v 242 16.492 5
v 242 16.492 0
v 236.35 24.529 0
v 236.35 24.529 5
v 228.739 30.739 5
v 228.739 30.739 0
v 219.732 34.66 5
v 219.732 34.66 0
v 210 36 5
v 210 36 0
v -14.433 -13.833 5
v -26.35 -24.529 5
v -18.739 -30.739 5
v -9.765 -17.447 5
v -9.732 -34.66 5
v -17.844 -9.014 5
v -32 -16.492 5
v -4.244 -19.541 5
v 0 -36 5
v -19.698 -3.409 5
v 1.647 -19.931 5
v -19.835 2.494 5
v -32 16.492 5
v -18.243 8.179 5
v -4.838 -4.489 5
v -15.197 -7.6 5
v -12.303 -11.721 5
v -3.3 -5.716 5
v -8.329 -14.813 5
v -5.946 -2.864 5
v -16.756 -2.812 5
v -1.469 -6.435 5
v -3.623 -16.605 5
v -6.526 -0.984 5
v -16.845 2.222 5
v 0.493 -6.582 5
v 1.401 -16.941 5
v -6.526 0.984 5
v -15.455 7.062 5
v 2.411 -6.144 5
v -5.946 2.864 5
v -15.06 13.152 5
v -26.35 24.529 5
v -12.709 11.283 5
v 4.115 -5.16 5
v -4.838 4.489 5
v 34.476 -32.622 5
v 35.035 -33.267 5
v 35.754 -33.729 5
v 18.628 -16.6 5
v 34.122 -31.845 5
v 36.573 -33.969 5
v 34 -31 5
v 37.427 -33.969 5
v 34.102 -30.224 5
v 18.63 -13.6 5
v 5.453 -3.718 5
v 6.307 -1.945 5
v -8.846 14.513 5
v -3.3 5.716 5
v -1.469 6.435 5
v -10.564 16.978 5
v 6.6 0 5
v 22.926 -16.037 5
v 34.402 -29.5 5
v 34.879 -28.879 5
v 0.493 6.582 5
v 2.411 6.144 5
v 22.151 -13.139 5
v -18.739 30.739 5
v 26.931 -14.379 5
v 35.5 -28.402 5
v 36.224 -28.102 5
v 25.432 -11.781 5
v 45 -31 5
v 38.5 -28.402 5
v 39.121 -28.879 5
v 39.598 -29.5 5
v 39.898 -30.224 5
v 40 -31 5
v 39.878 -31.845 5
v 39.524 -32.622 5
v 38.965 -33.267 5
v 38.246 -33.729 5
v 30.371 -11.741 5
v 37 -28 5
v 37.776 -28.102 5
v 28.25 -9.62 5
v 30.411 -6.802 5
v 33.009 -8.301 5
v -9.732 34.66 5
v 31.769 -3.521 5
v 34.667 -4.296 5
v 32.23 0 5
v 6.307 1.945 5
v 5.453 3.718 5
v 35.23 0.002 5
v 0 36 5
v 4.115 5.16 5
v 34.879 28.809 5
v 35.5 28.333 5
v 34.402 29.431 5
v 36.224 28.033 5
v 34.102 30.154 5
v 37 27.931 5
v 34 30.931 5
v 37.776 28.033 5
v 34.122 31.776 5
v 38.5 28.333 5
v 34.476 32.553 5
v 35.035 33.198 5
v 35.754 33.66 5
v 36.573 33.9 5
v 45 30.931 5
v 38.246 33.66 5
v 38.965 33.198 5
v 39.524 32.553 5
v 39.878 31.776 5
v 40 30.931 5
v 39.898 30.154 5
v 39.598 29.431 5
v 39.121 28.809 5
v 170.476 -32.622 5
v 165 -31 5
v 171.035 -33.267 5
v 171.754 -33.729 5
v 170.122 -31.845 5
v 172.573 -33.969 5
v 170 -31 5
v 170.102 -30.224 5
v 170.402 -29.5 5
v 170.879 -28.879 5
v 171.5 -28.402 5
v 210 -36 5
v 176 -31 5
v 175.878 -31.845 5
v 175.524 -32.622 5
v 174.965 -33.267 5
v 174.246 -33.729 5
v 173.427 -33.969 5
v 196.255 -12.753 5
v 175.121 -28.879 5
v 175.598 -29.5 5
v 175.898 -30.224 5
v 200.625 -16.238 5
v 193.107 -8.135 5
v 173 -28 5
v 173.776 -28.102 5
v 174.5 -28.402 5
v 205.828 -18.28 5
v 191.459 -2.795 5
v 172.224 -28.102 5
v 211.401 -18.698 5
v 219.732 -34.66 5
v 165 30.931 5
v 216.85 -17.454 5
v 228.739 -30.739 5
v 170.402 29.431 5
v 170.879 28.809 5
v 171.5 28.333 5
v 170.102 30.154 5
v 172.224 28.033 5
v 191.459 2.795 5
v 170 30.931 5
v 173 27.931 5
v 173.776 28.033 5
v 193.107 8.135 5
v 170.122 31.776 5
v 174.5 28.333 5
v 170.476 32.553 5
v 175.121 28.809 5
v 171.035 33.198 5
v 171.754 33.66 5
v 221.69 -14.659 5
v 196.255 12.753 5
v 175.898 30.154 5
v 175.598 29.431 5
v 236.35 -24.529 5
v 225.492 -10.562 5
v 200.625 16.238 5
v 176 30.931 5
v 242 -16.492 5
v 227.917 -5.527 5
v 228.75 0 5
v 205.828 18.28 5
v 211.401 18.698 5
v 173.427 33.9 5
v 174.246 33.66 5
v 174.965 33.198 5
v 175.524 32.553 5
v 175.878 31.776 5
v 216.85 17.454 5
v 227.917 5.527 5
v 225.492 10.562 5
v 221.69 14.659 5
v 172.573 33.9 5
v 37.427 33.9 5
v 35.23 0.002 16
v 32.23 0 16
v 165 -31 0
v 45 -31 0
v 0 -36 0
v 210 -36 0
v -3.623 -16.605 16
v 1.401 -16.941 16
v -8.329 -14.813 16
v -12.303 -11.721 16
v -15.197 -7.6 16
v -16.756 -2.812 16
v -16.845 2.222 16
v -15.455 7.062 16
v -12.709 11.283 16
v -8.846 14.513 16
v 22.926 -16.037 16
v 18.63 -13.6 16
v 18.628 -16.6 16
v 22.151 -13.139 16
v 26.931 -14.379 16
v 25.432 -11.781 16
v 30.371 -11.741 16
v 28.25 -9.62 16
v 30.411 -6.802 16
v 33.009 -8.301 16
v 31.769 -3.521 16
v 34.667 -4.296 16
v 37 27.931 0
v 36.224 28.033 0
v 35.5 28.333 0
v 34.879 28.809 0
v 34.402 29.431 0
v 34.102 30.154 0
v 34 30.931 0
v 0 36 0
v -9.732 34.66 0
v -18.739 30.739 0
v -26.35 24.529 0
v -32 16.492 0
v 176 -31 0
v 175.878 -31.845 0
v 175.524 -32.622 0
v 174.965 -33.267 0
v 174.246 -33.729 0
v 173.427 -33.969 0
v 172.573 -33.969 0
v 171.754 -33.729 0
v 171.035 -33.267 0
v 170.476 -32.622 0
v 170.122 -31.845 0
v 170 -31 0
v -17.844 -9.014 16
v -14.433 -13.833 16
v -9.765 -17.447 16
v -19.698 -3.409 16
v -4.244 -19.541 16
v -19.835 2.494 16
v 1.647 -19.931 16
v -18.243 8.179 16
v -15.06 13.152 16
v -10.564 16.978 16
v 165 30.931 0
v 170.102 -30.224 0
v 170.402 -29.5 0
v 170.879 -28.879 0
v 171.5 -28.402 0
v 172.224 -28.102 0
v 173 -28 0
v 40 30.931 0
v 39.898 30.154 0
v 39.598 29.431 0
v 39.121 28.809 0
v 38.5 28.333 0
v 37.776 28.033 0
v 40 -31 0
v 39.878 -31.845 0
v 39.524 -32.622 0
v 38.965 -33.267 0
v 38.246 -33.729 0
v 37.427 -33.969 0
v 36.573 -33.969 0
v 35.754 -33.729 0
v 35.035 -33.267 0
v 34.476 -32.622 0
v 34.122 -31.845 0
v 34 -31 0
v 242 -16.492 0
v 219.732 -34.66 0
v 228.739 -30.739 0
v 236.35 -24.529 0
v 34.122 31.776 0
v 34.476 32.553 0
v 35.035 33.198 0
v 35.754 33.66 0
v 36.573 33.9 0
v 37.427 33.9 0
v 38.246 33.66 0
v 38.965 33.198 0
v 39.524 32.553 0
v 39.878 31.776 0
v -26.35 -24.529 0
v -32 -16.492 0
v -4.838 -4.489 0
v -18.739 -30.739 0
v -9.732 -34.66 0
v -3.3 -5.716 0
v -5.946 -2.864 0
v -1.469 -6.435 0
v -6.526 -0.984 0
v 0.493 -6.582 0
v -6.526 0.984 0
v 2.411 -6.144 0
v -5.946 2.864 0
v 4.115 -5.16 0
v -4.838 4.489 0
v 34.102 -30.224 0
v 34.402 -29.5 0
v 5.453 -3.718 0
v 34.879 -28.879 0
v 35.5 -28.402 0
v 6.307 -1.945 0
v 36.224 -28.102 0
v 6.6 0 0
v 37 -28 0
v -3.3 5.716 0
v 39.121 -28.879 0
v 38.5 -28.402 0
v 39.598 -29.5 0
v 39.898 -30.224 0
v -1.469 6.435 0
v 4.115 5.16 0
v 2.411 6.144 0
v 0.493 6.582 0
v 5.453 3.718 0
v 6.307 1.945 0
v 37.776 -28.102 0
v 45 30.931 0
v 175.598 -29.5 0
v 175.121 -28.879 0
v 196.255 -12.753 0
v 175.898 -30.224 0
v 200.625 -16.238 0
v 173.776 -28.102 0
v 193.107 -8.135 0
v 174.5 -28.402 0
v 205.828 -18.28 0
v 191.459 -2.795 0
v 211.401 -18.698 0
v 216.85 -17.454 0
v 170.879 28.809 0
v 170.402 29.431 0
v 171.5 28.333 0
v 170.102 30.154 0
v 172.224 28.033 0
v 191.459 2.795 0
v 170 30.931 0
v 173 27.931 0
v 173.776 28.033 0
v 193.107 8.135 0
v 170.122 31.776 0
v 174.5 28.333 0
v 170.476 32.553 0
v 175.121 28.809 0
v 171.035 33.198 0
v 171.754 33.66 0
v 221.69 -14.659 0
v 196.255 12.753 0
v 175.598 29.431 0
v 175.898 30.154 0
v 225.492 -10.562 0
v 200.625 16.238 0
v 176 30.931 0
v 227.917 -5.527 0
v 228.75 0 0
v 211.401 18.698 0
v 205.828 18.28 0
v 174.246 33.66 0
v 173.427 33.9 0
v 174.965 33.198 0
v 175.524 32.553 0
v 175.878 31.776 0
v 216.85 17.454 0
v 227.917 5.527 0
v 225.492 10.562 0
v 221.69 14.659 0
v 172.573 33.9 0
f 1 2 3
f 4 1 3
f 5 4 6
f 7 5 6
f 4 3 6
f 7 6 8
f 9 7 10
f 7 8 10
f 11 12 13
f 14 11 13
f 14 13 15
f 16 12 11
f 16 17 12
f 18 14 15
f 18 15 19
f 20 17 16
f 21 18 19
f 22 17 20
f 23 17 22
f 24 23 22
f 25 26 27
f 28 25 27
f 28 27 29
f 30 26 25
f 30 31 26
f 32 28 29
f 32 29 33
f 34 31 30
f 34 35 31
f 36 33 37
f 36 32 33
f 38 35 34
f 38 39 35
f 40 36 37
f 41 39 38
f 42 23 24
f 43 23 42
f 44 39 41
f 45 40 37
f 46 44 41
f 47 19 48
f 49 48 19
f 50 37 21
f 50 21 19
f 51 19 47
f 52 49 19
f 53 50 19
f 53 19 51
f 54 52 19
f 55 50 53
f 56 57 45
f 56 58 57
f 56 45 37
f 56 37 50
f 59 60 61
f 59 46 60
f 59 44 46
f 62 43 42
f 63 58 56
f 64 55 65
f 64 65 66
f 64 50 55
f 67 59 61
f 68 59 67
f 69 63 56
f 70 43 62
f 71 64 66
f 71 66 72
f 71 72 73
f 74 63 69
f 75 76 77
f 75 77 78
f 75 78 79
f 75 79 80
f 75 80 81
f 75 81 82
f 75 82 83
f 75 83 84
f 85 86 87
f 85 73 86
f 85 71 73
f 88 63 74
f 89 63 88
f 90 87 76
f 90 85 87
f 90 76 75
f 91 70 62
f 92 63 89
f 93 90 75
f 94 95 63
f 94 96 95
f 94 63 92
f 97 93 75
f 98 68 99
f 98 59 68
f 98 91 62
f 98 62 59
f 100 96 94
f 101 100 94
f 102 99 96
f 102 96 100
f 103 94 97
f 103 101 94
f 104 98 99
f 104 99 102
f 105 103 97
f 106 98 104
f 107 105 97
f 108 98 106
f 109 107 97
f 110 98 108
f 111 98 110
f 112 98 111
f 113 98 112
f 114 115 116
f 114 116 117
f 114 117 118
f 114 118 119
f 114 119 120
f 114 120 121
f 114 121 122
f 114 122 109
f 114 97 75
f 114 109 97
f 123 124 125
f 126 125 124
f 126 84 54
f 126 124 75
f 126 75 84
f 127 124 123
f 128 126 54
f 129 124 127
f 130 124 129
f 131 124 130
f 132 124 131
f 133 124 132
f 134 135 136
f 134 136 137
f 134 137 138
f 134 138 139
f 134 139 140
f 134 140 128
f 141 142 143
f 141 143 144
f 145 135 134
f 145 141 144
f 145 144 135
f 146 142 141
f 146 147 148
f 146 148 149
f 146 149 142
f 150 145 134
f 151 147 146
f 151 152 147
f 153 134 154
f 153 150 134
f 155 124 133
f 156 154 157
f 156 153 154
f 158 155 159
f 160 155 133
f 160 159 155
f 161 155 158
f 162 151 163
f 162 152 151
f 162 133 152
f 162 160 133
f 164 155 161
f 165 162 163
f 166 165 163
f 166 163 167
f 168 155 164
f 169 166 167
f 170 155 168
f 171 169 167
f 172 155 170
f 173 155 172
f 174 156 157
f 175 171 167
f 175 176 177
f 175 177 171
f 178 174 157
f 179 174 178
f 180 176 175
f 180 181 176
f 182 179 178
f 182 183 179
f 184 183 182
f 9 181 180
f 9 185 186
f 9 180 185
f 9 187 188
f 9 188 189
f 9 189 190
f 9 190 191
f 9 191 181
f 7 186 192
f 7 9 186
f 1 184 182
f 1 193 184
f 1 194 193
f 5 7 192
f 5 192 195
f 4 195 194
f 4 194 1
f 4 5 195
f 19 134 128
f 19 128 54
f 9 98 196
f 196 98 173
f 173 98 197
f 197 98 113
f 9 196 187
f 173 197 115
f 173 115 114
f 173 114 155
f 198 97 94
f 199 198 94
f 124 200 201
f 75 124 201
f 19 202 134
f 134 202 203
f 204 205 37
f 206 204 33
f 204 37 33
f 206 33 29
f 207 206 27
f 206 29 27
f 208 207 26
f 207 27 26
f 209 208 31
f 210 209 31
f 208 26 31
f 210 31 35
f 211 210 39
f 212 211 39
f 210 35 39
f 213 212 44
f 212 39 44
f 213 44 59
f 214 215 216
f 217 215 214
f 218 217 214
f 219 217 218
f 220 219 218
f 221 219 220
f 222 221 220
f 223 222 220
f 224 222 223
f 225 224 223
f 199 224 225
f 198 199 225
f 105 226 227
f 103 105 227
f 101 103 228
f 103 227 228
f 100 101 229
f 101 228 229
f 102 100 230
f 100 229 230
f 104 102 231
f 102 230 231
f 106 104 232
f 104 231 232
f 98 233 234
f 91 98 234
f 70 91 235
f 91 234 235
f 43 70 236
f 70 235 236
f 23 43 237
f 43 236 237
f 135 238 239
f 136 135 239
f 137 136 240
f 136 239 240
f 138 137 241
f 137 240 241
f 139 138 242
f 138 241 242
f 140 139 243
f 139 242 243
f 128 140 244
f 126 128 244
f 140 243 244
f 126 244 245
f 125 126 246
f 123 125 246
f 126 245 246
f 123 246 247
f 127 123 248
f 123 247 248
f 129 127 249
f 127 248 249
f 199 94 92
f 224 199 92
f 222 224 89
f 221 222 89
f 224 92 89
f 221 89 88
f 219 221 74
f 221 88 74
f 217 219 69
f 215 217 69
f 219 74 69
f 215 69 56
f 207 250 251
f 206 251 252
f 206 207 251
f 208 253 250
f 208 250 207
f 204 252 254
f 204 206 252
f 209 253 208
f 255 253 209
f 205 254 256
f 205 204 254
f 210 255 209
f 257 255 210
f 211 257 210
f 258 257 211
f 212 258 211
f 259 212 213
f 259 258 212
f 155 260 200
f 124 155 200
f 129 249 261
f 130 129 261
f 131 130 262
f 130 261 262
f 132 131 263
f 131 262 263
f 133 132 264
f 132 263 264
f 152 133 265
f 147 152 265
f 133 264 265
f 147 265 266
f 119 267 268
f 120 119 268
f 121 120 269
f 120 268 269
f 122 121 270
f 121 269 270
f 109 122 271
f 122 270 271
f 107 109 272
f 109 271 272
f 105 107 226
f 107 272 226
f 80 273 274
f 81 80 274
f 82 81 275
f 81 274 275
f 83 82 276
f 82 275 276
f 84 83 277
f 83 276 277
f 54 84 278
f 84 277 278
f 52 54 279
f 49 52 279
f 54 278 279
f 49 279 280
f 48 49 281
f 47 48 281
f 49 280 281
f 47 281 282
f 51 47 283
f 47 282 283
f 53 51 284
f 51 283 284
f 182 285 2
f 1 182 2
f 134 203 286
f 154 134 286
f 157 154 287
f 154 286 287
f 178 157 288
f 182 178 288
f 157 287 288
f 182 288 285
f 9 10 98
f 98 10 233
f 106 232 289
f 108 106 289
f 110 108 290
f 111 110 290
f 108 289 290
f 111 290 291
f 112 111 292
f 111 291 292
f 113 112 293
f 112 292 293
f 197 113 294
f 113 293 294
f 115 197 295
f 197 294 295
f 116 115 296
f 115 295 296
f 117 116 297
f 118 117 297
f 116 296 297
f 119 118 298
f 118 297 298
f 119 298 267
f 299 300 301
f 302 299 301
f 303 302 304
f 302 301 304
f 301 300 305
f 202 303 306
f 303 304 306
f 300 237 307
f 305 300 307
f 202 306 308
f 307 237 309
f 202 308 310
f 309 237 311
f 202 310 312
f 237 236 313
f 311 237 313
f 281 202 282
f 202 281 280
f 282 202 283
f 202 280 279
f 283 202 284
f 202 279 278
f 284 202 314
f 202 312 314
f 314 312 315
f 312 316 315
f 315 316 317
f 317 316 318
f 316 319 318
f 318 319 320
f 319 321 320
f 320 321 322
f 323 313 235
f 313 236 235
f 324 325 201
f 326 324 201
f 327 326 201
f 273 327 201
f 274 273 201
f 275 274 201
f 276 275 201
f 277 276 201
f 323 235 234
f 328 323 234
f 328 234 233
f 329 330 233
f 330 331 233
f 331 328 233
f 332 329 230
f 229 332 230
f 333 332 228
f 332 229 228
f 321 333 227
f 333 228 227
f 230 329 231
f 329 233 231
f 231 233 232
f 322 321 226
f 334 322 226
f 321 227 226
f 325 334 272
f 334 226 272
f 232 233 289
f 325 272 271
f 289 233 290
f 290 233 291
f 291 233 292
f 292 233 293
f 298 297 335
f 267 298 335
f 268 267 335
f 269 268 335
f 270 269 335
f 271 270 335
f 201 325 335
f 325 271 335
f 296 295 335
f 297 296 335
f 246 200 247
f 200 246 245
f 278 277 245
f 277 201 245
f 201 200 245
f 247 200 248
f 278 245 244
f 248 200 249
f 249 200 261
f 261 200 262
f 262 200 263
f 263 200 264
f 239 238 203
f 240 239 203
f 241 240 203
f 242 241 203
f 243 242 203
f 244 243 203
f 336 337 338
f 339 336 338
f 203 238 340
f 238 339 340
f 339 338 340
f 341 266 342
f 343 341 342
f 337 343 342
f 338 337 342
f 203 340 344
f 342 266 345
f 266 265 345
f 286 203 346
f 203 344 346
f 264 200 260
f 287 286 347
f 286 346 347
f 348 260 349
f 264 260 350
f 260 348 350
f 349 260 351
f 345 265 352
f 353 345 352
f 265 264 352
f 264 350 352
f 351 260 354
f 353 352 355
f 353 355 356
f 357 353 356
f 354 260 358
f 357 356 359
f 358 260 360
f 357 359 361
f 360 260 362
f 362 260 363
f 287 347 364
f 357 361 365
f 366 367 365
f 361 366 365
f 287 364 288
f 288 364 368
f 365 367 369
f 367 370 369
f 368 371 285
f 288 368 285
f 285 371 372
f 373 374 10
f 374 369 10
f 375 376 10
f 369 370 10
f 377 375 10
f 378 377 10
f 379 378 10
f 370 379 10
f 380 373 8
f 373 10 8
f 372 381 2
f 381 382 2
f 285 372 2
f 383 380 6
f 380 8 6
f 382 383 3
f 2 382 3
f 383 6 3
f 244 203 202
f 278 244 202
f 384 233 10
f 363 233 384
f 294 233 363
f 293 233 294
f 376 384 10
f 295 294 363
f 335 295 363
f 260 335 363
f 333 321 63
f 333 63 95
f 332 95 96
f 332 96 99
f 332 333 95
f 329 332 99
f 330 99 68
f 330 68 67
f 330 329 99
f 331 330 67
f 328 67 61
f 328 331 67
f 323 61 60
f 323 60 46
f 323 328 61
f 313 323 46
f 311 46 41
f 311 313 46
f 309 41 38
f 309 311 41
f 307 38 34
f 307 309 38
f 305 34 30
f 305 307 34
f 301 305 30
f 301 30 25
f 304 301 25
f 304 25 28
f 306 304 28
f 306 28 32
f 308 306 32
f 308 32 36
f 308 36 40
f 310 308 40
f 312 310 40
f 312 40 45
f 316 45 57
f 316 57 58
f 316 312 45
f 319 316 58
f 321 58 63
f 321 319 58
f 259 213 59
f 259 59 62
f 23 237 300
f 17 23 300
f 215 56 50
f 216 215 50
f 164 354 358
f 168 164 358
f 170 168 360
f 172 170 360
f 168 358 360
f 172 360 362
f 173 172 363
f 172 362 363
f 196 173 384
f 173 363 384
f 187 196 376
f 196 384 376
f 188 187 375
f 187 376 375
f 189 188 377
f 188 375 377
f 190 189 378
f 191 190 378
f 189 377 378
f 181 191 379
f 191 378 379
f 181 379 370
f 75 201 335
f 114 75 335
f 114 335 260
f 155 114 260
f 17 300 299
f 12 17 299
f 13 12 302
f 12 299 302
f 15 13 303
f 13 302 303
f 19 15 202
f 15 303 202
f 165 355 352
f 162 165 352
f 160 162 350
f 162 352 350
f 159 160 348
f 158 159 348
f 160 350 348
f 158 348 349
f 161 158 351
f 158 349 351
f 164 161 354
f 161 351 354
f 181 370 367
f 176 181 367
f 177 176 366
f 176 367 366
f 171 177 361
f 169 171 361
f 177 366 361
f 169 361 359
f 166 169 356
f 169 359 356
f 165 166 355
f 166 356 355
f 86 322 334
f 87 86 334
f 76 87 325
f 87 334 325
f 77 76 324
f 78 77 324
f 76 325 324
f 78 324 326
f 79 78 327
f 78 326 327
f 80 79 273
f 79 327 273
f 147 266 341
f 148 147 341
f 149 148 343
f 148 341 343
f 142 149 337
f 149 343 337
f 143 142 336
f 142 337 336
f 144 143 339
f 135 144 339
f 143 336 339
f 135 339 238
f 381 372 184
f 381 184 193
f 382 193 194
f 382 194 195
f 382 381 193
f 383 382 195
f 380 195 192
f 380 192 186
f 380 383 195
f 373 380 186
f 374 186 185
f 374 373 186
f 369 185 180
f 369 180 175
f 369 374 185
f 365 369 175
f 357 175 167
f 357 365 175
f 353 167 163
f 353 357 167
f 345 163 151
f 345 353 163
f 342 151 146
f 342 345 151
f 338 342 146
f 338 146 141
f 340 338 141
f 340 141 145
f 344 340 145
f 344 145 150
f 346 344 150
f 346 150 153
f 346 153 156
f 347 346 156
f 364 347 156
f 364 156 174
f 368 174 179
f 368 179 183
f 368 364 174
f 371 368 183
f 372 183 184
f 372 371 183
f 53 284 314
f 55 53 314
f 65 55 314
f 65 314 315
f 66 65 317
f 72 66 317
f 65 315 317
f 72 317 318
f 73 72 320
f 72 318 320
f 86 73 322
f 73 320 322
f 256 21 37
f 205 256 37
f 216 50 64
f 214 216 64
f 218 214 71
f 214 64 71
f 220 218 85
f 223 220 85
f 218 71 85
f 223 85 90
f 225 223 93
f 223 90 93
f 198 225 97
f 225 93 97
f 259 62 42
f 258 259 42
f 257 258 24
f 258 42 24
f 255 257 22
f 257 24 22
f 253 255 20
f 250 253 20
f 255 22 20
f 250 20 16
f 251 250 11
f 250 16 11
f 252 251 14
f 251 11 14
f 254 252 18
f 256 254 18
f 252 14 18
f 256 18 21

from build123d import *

# Parameters (mm, degrees)
F0_R     = 30
F0_R_2   = 10
F0_R_3   = 21.5
F0_R_4   = 18.75
F0_R_5   = 6.6
F1_DEPTH = 5
F3_DEPTH = 11


with BuildPart() as f1:
    # F0 (on Top) → F1 (new body)
    with BuildSketch(Plane.XY):
        with BuildLine():
            ThreePointArc((18.3030052177, -31), (31.2642622481, -17.8478543831), (36, 0))
            ThreePointArc((36, 0), (31.2978497092, 17.7888898917), (18.4197442455, 30.9307779069))
            ThreePointArc((18.4197442455, 30.9307779069), (9.5522770937, 34.7095664382), (0, 36))
            ThreePointArc((0, 36), (-18.7386337537, 30.7386337537), (-32, 16.4924225025))
            Line((-32, 16.4924225025), (-32, -16.4924225025))
            ThreePointArc((-32, -16.4924225025), (-18.7386337537, -30.7386337537), (0, -36))
            ThreePointArc((0, -36), (9.4868329805, -34.7275107084), (18.3030052177, -31))
        make_face()
        Circle(F0_R, mode=Mode.SUBTRACT)
        with BuildLine():
            ThreePointArc((242, 16.4924225025), (228.7386337537, 30.7386337537), (210, 36))
            ThreePointArc((210, 36), (200.4477229063, 34.7095664382), (191.5802557545, 30.9307779069))
            ThreePointArc((191.5802557545, 30.9307779069), (174.0000639573, -0.0678595955), (191.6969947823, -31))
            ThreePointArc((191.6969947823, -31), (200.5131670195, -34.7275107084), (210, -36))
            ThreePointArc((210, -36), (228.7386337537, -30.7386337537), (242, -16.4924225025))
            Line((242, -16.4924225025), (242, 16.4924225025))
        make_face()
        with Locations((210, 0)):
            Circle(F0_R, mode=Mode.SUBTRACT)
        Circle(F0_R)
        Circle(F0_R_2, mode=Mode.SUBTRACT)
        with Locations((210, 0)):
            Circle(F0_R)
        with Locations((210, 0)):
            Circle(F0_R_3, mode=Mode.SUBTRACT)
        with Locations((210, 0)):
            Circle(F0_R_3)
        with Locations((210, 0)):
            Circle(F0_R_4, mode=Mode.SUBTRACT)
        with BuildLine():
            ThreePointArc((19.6214168703, 36), (23.4046464655, 33.6633706545), (26.9125802938, 30.9307779069))
            Line((26.9125802938, 30.9307779069), (34, 30.9307779069))
            ThreePointArc((34, 30.9307779069), (37, 33.9307779069), (40, 30.9307779069))
            Line((40, 30.9307779069), (45, 30.9307779069))
            Line((45, 30.9307779069), (165, 30.9307779069))
            Line((165, 30.9307779069), (170, 30.9307779069))
            ThreePointArc((170, 30.9307779069), (173, 33.9307779069), (176, 30.9307779069))
            Line((176, 30.9307779069), (183.0874197062, 30.9307779069))
            ThreePointArc((183.0874197062, 30.9307779069), (186.5953535345, 33.6633706545), (190.3785831296, 36))
            Line((190.3785831296, 36), (19.6214168703, 36))
        make_face()
        with BuildLine():
            Line((34, -31), (26.83281573, -31))
            ThreePointArc((26.83281573, -31), (23.361269906, -33.693487032), (19.6214168703, -36))
            Line((19.6214168703, -36), (190.3785831296, -36))
            ThreePointArc((190.3785831296, -36), (186.638730094, -33.693487032), (183.16718427, -31))
            Line((183.16718427, -31), (176, -31))
            ThreePointArc((176, -31), (173, -34), (170, -31))
            Line((170, -31), (165, -31))
            Line((165, -31), (45, -31))
            Line((45, -31), (40, -31))
            ThreePointArc((40, -31), (37, -34), (34, -31))
        make_face()
        with BuildLine():
            Line((37, 27.9307779069), (37, 17.6635217327))
            ThreePointArc((37, 17.6635217327), (39.9874980463, 9.0553851381), (41, 0))
            ThreePointArc((41, 0), (39.9874980463, -9.0553851381), (37, -17.6635217327))
            Line((37, -17.6635217327), (37, -28))
            ThreePointArc((37, -28), (39.1213203436, -28.8786796564), (40, -31))
            Line((40, -31), (45, -31))
            Line((45, -31), (45, 30.9307779069))
            Line((45, 30.9307779069), (40, 30.9307779069))
            ThreePointArc((40, 30.9307779069), (39.1213203436, 28.8094575634), (37, 27.9307779069))
        make_face()
        with BuildLine():
            ThreePointArc((173, -17.6635217327), (169, 0), (173, 17.6635217327))
            Line((173, 17.6635217327), (173, 27.9307779069))
            ThreePointArc((173, 27.9307779069), (170.8786796564, 28.8094575634), (170, 30.9307779069))
            Line((170, 30.9307779069), (165, 30.9307779069))
            Line((165, 30.9307779069), (165, -31))
            Line((165, -31), (170, -31))
            ThreePointArc((170, -31), (170.8786796564, -28.8786796564), (173, -28))
            Line((173, -28), (173, -17.6635217327))
        make_face()
        Circle(F0_R_2)
        Circle(F0_R_5, mode=Mode.SUBTRACT)
        with BuildLine():
            ThreePointArc((18.4197442455, 30.9307779069), (31.2978497092, 17.7888898917), (36, 0))
            ThreePointArc((36, 0), (31.2642622481, -17.8478543831), (18.3030052177, -31))
            Line((18.3030052177, -31), (26.83281573, -31))
            ThreePointArc((26.83281573, -31), (32.6055594055, -24.8571417474), (37, -17.6635217327))
            Line((37, -17.6635217327), (37, 17.6635217327))
            ThreePointArc((37, 17.6635217327), (32.6375474194, 24.815126404), (26.9125802938, 30.9307779069))
            Line((26.9125802938, 30.9307779069), (18.4197442455, 30.9307779069))
        make_face()
        with BuildLine():
            Line((191.5802557545, 30.9307779069), (183.0874197062, 30.9307779069))
            ThreePointArc((183.0874197062, 30.9307779069), (177.3624525806, 24.815126404), (173, 17.6635217327))
            Line((173, 17.6635217327), (173, -17.6635217327))
            ThreePointArc((173, -17.6635217327), (177.3944405945, -24.8571417474), (183.16718427, -31))
            Line((183.16718427, -31), (191.6969947823, -31))
            ThreePointArc((191.6969947823, -31), (174.0000639573, -0.0678595955), (191.5802557545, 30.9307779069))
        make_face()
        with BuildLine():
            ThreePointArc((41, 0), (39.9874980463, 9.0553851381), (37, 17.6635217327))
            Line((37, 17.6635217327), (37, -17.6635217327))
            ThreePointArc((37, -17.6635217327), (39.9874980463, -9.0553851381), (41, 0))
        make_face()
        with BuildLine():
            Line((173, -17.6635217327), (173, 17.6635217327))
            ThreePointArc((173, 17.6635217327), (169, 0), (173, -17.6635217327))
        make_face()
        with BuildLine():
            ThreePointArc((0, 36), (9.5522770937, 34.7095664382), (18.4197442455, 30.9307779069))
            Line((18.4197442455, 30.9307779069), (26.9125802938, 30.9307779069))
            ThreePointArc((26.9125802938, 30.9307779069), (23.4046464655, 33.6633706545), (19.6214168703, 36))
            Line((19.6214168703, 36), (0, 36))
        make_face()
        with BuildLine():
            Line((210, 36), (190.3785831296, 36))
            ThreePointArc((190.3785831296, 36), (186.5953535345, 33.6633706545), (183.0874197062, 30.9307779069))
            Line((183.0874197062, 30.9307779069), (191.5802557545, 30.9307779069))
            ThreePointArc((191.5802557545, 30.9307779069), (200.4477229063, 34.7095664382), (210, 36))
        make_face()
        with BuildLine():
            Line((26.83281573, -31), (18.3030052177, -31))
            ThreePointArc((18.3030052177, -31), (9.4868329805, -34.7275107084), (0, -36))
            Line((0, -36), (19.6214168703, -36))
            ThreePointArc((19.6214168703, -36), (23.361269906, -33.693487032), (26.83281573, -31))
        make_face()
        with BuildLine():
            ThreePointArc((183.16718427, -31), (186.638730094, -33.693487032), (190.3785831296, -36))
            Line((190.3785831296, -36), (210, -36))
            ThreePointArc((210, -36), (200.5131670195, -34.7275107084), (191.6969947823, -31))
            Line((191.6969947823, -31), (183.16718427, -31))
        make_face()
        with BuildLine():
            ThreePointArc((37, -17.6635217327), (32.6055594055, -24.8571417474), (26.83281573, -31))
            Line((26.83281573, -31), (34, -31))
            ThreePointArc((34, -31), (34.8786796564, -28.8786796564), (37, -28))
            Line((37, -28), (37, -17.6635217327))
        make_face()
        with BuildLine():
            Line((176, -31), (183.16718427, -31))
            ThreePointArc((183.16718427, -31), (177.3944405945, -24.8571417474), (173, -17.6635217327))
            Line((173, -17.6635217327), (173, -28))
            ThreePointArc((173, -28), (175.1213203436, -28.8786796564), (176, -31))
        make_face()
        with BuildLine():
            Line((34, 30.9307779069), (26.9125802938, 30.9307779069))
            ThreePointArc((26.9125802938, 30.9307779069), (32.6375474194, 24.815126404), (37, 17.6635217327))
            Line((37, 17.6635217327), (37, 27.9307779069))
            ThreePointArc((37, 27.9307779069), (34.8786796564, 28.8094575634), (34, 30.9307779069))
        make_face()
        with BuildLine():
            ThreePointArc((173, 17.6635217327), (177.3624525806, 24.815126404), (183.0874197062, 30.9307779069))
            Line((183.0874197062, 30.9307779069), (176, 30.9307779069))
            ThreePointArc((176, 30.9307779069), (175.1213203436, 28.8094575634), (173, 27.9307779069))
            Line((173, 27.9307779069), (173, 17.6635217327))
        make_face()
    extrude(amount=F1_DEPTH)

    # F2 (on face) → F3 (join)
    with BuildSketch(Plane.XY.offset(5)):
        with BuildLine():
            ThreePointArc((32.2300370842, 0), (28.249548951, -9.6195118668), (18.6300370842, -13.6))
            Line((18.6300370842, -13.6), (18.6278837067, -16.5999992272))
            ThreePointArc((18.6278837067, -16.5999992272), (30.3708692945, -11.7408322103), (35.2300363114, 0.0021533775))
            Line((35.2300363114, 0.0021533775), (32.2300370842, 0))
        make_face()
        with BuildLine():
            ThreePointArc((1.4010723087, -16.9409777332), (-16.154736314, -5.264086135), (-8.8464426541, 14.5133013966))
            Line((-8.8464426541, 14.5133013966), (-10.5643945811, 16.9784386755))
            ThreePointArc((-10.5643945811, 16.9784386755), (-18.9787357989, -6.2800054738), (1.6467177805, -19.9309038698))
            Line((1.6467177805, -19.9309038698), (1.4010723087, -16.9409777332))
        make_face()
    extrude(amount=F3_DEPTH)


solid = f1.part
